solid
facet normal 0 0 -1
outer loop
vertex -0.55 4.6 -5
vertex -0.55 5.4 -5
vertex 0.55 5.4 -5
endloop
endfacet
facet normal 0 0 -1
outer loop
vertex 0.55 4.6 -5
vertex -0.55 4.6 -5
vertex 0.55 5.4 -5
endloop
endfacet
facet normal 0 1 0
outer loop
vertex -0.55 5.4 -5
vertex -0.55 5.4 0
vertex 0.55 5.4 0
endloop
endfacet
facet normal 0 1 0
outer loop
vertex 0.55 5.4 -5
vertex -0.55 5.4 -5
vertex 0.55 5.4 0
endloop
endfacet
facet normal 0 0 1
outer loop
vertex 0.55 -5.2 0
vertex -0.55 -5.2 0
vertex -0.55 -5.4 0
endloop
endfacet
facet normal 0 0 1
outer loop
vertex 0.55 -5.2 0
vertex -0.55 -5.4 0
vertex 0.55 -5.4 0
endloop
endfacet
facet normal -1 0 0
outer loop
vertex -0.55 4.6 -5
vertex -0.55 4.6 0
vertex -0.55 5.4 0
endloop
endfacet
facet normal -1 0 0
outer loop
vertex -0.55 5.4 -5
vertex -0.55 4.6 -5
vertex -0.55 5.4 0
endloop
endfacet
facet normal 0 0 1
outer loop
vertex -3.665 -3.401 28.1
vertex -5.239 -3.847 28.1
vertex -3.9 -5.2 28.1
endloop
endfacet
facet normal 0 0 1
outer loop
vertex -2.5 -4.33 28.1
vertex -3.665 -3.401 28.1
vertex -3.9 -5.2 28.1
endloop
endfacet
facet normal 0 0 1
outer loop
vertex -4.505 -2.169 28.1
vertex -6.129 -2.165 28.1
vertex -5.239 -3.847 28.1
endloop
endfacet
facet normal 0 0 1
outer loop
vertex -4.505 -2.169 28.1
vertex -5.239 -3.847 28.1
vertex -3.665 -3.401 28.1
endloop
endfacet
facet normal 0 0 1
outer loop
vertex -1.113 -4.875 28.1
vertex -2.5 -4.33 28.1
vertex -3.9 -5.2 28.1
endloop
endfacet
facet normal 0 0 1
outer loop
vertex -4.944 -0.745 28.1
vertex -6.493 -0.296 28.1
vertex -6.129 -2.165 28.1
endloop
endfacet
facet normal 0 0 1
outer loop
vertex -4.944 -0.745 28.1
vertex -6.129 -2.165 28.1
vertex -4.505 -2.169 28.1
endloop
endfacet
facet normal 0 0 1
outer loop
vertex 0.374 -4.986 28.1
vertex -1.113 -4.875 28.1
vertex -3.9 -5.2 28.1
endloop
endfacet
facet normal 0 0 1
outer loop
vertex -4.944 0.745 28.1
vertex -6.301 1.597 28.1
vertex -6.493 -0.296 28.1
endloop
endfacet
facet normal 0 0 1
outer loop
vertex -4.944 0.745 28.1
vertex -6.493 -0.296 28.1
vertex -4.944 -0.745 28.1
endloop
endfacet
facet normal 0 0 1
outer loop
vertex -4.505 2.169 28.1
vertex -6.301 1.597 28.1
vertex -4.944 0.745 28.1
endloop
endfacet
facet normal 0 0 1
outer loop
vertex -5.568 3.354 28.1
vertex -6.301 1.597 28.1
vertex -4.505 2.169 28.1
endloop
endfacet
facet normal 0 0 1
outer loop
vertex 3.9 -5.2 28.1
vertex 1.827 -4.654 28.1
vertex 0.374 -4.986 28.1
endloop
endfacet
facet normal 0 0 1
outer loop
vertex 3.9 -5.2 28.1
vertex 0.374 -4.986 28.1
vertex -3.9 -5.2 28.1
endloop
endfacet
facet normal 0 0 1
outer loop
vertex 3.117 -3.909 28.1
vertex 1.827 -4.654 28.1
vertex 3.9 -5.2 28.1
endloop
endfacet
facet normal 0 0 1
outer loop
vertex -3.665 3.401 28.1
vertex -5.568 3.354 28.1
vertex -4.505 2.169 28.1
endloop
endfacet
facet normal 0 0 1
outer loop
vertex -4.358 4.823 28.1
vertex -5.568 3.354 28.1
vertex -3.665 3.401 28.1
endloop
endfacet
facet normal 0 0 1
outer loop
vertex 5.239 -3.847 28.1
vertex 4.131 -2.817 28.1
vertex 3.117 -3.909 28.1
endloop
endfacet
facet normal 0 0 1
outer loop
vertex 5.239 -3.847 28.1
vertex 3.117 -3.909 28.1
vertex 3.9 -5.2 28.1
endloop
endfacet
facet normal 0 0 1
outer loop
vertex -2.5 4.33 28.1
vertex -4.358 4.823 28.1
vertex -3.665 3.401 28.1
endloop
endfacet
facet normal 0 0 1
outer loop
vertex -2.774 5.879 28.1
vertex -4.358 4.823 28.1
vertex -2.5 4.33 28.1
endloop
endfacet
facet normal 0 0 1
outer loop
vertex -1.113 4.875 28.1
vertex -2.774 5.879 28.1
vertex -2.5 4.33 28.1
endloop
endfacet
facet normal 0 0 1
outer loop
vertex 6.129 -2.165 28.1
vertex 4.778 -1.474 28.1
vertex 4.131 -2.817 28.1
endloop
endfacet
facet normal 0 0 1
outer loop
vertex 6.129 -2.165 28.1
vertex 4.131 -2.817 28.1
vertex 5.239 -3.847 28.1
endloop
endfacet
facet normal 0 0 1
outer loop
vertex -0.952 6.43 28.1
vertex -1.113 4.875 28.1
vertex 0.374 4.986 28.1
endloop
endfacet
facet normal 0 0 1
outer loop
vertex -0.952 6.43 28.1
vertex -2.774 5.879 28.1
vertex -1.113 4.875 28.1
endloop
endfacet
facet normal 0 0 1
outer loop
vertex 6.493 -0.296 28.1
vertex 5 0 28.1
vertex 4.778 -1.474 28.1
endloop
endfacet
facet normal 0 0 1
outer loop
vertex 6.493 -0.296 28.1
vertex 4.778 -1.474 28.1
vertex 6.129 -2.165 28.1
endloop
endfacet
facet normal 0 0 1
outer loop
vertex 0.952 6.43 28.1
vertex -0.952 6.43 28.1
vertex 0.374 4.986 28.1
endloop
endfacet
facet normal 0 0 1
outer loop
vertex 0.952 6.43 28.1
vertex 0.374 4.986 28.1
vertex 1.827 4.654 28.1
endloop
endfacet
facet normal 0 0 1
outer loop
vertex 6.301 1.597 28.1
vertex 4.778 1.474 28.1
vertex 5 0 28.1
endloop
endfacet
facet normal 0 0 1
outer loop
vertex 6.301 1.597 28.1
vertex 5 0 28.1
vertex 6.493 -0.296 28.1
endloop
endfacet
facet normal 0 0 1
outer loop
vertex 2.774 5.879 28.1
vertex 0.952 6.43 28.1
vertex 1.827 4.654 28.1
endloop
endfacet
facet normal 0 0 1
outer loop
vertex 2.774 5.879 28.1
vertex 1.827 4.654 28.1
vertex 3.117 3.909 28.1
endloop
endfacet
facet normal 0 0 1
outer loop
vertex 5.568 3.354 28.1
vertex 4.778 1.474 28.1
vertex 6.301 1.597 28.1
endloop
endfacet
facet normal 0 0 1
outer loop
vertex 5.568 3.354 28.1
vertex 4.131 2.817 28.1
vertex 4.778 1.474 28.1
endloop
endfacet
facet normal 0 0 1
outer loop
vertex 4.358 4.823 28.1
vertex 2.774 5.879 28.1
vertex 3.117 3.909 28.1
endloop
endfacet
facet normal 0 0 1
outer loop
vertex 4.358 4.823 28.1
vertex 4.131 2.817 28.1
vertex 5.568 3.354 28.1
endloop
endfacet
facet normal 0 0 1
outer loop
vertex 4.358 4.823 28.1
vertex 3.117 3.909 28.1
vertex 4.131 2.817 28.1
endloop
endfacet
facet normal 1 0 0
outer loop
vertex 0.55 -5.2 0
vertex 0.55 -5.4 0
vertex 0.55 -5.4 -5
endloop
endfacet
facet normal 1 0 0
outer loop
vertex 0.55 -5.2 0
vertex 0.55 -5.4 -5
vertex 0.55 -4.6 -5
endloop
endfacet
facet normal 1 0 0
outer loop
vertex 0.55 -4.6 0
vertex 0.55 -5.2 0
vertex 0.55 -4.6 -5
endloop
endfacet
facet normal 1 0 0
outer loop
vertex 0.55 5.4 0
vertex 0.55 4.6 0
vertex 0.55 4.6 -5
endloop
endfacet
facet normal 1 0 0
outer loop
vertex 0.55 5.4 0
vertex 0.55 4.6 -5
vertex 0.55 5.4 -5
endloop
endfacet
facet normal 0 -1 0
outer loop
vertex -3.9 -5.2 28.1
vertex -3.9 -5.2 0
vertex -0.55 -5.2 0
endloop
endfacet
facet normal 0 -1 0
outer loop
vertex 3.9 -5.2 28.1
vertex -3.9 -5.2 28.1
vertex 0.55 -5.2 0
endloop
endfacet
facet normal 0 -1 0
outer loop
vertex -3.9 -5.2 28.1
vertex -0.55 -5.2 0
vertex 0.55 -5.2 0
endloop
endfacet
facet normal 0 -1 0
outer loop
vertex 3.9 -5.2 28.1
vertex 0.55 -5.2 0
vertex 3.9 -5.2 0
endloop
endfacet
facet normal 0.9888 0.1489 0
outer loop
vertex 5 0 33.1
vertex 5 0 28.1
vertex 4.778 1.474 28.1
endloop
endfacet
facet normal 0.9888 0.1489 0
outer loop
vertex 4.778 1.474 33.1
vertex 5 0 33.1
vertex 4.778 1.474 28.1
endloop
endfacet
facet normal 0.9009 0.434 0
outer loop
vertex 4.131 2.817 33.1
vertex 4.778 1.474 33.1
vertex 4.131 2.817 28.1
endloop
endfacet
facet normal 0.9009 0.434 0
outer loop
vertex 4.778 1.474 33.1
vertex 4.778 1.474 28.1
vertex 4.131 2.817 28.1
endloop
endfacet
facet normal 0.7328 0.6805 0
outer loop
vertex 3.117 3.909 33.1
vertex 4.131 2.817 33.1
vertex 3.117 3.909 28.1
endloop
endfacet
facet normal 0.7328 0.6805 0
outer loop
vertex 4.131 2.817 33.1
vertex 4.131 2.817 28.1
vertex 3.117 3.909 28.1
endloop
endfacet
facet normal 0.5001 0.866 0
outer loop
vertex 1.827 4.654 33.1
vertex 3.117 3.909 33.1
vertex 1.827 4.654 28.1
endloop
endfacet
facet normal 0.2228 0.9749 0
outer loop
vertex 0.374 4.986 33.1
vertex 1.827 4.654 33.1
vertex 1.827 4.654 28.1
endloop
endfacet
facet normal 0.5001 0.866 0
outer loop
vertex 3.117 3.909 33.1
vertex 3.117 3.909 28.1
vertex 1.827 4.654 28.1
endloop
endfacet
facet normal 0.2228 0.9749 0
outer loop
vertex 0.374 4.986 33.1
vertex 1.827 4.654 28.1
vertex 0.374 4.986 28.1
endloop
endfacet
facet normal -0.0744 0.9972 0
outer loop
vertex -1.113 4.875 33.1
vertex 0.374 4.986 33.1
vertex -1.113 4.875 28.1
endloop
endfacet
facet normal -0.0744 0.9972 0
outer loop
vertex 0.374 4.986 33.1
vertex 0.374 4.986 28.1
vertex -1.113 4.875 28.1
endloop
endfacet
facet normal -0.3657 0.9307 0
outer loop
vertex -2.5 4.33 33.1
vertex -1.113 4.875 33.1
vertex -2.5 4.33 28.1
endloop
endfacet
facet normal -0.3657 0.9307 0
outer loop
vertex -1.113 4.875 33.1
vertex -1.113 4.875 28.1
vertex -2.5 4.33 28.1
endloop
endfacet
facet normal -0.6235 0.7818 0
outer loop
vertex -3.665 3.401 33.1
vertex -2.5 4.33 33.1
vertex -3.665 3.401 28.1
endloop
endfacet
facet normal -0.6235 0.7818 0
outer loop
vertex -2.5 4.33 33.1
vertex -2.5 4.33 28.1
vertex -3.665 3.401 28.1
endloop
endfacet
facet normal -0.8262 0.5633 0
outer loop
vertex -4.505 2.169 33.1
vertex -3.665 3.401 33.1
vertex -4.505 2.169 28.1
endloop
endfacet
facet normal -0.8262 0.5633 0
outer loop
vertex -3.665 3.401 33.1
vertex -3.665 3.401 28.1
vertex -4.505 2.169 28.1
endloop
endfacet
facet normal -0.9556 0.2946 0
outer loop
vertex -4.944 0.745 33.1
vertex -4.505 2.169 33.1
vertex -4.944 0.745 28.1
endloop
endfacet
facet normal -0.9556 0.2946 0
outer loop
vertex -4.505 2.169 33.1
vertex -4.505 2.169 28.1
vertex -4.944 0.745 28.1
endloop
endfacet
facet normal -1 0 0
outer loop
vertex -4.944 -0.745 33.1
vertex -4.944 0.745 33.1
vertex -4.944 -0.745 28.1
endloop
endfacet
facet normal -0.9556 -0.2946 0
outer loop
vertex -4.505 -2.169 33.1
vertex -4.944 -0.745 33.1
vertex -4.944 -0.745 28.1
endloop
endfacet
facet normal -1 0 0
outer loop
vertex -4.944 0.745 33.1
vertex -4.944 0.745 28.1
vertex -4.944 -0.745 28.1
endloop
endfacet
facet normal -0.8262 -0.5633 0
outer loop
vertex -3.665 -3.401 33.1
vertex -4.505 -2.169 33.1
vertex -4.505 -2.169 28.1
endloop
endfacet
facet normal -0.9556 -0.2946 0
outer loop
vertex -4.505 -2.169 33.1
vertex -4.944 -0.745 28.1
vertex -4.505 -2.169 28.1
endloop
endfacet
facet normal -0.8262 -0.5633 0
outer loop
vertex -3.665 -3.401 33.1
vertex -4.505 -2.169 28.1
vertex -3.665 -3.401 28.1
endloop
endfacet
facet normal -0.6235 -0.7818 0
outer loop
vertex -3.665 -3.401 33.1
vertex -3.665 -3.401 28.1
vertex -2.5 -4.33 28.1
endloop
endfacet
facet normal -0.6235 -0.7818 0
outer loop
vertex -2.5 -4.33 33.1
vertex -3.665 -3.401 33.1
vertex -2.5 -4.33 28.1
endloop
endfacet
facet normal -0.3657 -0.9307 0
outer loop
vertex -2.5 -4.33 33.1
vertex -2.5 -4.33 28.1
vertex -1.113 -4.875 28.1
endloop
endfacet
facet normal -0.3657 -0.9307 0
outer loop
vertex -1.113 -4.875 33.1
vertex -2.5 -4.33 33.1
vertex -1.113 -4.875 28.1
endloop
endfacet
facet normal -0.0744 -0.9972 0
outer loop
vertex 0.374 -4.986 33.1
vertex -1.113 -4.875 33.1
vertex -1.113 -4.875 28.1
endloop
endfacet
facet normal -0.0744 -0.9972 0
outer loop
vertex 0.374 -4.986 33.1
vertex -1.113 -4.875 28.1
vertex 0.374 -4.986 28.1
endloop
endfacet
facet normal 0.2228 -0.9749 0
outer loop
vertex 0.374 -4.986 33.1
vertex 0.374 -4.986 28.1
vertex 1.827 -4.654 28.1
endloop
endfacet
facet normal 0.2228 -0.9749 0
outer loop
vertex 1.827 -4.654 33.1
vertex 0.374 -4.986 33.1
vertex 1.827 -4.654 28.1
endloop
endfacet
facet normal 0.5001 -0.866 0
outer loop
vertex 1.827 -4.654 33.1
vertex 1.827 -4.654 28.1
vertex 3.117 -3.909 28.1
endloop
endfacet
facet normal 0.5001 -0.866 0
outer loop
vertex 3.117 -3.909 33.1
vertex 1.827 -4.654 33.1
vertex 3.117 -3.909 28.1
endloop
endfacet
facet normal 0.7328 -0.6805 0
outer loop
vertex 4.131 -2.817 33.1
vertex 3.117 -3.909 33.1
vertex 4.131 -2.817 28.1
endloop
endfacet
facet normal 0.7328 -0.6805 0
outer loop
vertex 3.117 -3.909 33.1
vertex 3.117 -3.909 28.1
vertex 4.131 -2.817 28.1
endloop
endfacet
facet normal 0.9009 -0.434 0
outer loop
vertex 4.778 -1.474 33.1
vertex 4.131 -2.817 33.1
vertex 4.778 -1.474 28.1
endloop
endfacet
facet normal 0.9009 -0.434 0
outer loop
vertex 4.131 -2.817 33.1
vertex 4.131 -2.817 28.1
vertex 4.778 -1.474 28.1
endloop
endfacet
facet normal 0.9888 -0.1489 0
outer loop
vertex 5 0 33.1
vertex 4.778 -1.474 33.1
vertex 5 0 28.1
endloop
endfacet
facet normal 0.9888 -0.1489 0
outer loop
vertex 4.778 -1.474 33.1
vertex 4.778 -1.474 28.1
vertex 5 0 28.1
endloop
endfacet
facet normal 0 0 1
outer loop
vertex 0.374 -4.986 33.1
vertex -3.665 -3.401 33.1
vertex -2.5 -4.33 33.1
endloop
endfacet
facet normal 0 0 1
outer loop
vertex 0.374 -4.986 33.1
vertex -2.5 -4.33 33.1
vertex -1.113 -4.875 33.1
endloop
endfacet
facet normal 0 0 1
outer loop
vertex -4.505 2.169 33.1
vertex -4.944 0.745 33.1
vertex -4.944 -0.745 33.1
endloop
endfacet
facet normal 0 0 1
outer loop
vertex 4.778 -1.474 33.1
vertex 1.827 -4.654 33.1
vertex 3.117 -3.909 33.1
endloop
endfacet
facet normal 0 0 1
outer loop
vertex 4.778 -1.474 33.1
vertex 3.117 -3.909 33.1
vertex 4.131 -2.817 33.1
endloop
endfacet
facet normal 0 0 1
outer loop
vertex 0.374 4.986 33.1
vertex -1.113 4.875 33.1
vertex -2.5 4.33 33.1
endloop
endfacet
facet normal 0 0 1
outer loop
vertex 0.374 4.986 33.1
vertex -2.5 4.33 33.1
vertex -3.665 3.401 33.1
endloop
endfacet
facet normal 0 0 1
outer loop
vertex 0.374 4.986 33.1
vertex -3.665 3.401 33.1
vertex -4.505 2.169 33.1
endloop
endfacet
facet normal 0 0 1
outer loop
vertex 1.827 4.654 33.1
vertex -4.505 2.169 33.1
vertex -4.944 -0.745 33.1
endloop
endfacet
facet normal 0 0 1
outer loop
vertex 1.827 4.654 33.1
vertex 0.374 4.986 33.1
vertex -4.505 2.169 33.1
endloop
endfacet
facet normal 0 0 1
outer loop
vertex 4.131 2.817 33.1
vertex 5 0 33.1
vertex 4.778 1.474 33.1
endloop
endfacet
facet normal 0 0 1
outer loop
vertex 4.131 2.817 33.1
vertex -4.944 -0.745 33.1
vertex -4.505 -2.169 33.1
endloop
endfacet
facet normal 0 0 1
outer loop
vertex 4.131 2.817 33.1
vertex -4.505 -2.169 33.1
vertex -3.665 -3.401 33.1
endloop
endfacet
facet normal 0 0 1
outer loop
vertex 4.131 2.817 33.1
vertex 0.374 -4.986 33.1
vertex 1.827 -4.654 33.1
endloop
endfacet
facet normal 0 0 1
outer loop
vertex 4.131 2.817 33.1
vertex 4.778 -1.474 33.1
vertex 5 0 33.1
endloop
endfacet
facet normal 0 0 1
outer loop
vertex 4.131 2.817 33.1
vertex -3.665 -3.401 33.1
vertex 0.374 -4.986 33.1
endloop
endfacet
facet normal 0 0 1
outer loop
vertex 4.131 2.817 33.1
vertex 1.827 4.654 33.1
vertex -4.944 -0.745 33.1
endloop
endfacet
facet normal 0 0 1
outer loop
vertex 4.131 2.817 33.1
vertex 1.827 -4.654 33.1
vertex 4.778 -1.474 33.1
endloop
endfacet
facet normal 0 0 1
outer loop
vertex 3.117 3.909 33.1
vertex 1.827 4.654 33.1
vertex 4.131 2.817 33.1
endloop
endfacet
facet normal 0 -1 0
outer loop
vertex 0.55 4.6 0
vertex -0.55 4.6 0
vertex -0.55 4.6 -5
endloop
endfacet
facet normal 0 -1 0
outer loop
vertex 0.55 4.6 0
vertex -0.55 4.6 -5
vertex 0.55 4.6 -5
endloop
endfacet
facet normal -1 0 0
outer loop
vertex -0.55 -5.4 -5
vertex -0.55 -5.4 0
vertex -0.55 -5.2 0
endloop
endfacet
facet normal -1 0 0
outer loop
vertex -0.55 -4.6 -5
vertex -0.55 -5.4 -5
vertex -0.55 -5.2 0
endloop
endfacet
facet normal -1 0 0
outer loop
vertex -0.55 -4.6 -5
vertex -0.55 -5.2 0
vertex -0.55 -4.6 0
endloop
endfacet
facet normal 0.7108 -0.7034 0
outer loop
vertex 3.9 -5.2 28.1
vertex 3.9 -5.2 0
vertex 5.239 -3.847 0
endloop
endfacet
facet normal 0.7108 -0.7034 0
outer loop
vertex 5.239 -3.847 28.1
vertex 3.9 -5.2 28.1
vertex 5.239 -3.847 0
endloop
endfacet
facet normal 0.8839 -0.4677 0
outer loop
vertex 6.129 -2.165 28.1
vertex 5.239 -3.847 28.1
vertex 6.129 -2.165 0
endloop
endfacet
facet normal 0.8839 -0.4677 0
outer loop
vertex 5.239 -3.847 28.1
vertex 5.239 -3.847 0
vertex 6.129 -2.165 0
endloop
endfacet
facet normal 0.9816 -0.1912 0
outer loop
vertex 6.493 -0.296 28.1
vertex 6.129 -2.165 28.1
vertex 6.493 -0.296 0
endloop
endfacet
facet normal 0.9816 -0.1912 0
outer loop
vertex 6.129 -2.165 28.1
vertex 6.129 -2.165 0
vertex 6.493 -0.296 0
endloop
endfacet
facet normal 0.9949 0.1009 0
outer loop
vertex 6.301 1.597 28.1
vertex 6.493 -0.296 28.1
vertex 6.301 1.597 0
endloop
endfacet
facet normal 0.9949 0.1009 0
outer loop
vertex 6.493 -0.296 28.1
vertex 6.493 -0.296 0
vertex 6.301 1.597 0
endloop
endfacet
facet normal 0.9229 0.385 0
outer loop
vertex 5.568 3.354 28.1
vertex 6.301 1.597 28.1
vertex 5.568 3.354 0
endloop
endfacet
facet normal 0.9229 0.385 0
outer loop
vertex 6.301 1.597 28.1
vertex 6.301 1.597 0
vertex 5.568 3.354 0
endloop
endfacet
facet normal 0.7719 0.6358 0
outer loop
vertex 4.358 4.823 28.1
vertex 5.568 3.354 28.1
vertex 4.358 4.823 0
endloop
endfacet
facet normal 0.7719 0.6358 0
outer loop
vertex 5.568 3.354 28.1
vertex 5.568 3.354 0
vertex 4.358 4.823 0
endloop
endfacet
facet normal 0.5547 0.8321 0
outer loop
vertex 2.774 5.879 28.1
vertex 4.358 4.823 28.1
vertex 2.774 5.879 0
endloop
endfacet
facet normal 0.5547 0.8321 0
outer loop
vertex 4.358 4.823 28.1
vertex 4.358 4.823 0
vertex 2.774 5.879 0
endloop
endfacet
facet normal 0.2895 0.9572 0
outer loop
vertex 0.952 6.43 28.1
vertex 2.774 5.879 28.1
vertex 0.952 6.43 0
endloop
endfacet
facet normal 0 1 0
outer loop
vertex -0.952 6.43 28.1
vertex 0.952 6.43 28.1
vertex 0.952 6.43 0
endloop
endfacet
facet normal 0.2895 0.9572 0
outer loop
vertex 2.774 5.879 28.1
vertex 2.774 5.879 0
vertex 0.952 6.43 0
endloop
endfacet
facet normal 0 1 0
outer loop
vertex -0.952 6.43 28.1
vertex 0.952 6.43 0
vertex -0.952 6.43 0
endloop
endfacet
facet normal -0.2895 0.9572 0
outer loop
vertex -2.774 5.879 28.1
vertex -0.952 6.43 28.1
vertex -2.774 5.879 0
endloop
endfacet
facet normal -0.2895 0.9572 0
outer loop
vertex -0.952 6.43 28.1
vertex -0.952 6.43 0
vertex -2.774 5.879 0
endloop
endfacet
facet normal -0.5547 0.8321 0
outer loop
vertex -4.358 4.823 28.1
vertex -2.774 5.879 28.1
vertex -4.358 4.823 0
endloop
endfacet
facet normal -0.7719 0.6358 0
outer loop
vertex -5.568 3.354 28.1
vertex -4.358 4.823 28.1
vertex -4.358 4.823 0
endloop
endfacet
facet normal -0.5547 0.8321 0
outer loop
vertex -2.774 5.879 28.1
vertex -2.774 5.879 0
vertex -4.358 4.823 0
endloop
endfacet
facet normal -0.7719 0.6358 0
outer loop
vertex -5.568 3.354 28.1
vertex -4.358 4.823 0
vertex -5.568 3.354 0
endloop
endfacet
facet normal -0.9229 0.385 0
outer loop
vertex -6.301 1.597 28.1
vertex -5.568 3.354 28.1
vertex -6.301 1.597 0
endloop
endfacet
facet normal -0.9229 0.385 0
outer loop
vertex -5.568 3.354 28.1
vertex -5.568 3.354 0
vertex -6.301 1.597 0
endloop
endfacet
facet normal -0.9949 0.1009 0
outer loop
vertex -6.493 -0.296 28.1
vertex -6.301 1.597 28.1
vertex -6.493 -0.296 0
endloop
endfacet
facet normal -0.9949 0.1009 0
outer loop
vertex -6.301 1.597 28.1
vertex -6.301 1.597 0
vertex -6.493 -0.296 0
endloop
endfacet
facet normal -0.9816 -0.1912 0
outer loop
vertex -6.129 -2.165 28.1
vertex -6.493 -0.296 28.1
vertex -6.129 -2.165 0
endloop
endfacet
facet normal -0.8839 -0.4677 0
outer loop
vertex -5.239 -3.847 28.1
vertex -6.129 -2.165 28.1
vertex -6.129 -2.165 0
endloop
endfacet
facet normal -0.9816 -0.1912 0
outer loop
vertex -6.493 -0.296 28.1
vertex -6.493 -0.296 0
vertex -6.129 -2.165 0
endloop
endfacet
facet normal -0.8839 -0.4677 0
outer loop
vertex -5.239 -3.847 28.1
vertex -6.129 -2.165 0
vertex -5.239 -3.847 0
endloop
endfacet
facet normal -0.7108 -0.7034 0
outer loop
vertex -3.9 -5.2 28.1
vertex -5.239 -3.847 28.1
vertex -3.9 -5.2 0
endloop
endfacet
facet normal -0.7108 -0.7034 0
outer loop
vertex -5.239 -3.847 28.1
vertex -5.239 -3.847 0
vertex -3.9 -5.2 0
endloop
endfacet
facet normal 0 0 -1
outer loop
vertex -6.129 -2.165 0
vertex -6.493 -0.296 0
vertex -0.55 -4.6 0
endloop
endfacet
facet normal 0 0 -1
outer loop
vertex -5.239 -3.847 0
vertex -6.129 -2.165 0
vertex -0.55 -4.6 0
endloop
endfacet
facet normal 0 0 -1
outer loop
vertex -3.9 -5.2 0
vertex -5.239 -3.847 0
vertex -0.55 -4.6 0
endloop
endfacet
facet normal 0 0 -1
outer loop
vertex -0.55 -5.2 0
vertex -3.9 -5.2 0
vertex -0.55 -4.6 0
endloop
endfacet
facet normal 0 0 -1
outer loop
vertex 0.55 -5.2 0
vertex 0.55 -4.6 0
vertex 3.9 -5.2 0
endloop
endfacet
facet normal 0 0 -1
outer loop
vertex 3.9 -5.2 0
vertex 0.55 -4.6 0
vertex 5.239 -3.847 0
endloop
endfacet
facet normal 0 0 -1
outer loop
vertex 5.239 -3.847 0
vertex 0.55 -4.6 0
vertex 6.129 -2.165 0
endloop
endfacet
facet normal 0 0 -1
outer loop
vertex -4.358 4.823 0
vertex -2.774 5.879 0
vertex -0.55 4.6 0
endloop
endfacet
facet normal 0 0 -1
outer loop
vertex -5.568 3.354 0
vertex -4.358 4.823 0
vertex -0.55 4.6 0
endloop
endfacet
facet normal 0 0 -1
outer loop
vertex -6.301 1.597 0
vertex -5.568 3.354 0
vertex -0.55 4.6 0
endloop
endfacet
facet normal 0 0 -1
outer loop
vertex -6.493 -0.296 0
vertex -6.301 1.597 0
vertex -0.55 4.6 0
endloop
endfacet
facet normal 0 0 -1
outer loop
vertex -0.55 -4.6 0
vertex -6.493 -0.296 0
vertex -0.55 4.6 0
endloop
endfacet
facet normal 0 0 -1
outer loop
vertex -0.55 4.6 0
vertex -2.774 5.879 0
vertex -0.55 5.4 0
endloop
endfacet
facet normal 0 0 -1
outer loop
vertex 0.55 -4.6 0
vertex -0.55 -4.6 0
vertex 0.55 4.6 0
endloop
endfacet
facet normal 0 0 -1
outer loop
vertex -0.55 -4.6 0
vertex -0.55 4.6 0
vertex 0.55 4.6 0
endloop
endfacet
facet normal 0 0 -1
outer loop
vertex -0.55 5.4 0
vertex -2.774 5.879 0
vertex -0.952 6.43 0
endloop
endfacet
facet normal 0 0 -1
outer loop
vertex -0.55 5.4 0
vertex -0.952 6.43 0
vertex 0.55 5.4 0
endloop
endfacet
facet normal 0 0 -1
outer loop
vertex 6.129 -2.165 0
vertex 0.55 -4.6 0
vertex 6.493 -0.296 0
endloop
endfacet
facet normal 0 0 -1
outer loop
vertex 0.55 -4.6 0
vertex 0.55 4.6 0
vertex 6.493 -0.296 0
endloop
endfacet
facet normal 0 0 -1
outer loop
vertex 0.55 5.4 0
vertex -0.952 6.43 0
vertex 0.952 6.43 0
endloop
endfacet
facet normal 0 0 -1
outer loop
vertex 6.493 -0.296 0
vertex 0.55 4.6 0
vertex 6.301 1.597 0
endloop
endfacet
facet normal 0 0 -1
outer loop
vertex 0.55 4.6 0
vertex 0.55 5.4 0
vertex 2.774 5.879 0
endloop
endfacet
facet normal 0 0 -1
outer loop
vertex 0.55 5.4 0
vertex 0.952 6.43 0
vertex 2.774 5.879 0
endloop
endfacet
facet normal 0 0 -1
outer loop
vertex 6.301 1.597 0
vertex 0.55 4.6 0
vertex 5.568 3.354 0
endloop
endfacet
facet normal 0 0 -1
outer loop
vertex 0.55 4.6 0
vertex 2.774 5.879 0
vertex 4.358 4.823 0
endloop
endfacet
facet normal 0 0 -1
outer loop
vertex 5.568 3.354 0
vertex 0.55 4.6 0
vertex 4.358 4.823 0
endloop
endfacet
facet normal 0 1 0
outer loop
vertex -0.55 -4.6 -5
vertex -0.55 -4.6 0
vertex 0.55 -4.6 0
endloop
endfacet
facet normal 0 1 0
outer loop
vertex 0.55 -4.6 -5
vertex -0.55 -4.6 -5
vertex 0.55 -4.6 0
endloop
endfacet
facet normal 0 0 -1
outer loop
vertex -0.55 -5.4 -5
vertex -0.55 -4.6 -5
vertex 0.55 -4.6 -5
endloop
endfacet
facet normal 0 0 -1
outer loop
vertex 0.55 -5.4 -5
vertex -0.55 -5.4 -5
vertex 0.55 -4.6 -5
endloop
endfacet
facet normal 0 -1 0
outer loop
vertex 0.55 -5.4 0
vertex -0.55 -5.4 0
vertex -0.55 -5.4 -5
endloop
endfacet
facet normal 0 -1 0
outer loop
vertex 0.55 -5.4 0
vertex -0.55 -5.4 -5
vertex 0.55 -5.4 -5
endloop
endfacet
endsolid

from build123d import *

# Parameters (mm, degrees)
EXTRUDE_1_DEPTH     = 33.1
CUT_EXTRUDE_START   = -5
SKETCH_2_R          = 5
CUT_EXTRUDE_1_DEPTH = 5
SKETCH_3_W          = 1.1
SKETCH_3_H          = 0.8
EXTRUDE_2_DEPTH     = 5


with BuildPart() as part:
    # 草图1 → 凸台-拉伸1 (new body)
    with BuildSketch(Plane.XY):
        with BuildLine():
            Line((-3.9, -5.2), (3.9, -5.2))
            ThreePointArc((3.9, -5.2), (0, 6.5), (-3.9, -5.2))
        make_face()
    extrude(amount=EXTRUDE_1_DEPTH)

    # 草图2 → 切除-拉伸1 (cut)
    with BuildSketch(Plane.XY.offset(33.1).offset(CUT_EXTRUDE_START)):
        with BuildLine():
            Line((-3.9, -5.2), (3.9, -5.2))
            ThreePointArc((3.9, -5.2), (0, 6.5), (-3.9, -5.2))
        make_face()
        Circle(SKETCH_2_R, mode=Mode.SUBTRACT)
    extrude(amount=CUT_EXTRUDE_1_DEPTH, mode=Mode.SUBTRACT)

    # 草图3 → 凸台-拉伸2 (add)
    with BuildSketch(Plane(origin=(0, -5.2, 0), x_dir=(1, 0, 0), z_dir=(0, 0, 1))):
        with Locations((0, 10.2)):
            Rectangle(SKETCH_3_W, SKETCH_3_H)
        with Locations((0, 0.2)):
            Rectangle(SKETCH_3_W, SKETCH_3_H)
    extrude(amount=-EXTRUDE_2_DEPTH)


solid = part.part
